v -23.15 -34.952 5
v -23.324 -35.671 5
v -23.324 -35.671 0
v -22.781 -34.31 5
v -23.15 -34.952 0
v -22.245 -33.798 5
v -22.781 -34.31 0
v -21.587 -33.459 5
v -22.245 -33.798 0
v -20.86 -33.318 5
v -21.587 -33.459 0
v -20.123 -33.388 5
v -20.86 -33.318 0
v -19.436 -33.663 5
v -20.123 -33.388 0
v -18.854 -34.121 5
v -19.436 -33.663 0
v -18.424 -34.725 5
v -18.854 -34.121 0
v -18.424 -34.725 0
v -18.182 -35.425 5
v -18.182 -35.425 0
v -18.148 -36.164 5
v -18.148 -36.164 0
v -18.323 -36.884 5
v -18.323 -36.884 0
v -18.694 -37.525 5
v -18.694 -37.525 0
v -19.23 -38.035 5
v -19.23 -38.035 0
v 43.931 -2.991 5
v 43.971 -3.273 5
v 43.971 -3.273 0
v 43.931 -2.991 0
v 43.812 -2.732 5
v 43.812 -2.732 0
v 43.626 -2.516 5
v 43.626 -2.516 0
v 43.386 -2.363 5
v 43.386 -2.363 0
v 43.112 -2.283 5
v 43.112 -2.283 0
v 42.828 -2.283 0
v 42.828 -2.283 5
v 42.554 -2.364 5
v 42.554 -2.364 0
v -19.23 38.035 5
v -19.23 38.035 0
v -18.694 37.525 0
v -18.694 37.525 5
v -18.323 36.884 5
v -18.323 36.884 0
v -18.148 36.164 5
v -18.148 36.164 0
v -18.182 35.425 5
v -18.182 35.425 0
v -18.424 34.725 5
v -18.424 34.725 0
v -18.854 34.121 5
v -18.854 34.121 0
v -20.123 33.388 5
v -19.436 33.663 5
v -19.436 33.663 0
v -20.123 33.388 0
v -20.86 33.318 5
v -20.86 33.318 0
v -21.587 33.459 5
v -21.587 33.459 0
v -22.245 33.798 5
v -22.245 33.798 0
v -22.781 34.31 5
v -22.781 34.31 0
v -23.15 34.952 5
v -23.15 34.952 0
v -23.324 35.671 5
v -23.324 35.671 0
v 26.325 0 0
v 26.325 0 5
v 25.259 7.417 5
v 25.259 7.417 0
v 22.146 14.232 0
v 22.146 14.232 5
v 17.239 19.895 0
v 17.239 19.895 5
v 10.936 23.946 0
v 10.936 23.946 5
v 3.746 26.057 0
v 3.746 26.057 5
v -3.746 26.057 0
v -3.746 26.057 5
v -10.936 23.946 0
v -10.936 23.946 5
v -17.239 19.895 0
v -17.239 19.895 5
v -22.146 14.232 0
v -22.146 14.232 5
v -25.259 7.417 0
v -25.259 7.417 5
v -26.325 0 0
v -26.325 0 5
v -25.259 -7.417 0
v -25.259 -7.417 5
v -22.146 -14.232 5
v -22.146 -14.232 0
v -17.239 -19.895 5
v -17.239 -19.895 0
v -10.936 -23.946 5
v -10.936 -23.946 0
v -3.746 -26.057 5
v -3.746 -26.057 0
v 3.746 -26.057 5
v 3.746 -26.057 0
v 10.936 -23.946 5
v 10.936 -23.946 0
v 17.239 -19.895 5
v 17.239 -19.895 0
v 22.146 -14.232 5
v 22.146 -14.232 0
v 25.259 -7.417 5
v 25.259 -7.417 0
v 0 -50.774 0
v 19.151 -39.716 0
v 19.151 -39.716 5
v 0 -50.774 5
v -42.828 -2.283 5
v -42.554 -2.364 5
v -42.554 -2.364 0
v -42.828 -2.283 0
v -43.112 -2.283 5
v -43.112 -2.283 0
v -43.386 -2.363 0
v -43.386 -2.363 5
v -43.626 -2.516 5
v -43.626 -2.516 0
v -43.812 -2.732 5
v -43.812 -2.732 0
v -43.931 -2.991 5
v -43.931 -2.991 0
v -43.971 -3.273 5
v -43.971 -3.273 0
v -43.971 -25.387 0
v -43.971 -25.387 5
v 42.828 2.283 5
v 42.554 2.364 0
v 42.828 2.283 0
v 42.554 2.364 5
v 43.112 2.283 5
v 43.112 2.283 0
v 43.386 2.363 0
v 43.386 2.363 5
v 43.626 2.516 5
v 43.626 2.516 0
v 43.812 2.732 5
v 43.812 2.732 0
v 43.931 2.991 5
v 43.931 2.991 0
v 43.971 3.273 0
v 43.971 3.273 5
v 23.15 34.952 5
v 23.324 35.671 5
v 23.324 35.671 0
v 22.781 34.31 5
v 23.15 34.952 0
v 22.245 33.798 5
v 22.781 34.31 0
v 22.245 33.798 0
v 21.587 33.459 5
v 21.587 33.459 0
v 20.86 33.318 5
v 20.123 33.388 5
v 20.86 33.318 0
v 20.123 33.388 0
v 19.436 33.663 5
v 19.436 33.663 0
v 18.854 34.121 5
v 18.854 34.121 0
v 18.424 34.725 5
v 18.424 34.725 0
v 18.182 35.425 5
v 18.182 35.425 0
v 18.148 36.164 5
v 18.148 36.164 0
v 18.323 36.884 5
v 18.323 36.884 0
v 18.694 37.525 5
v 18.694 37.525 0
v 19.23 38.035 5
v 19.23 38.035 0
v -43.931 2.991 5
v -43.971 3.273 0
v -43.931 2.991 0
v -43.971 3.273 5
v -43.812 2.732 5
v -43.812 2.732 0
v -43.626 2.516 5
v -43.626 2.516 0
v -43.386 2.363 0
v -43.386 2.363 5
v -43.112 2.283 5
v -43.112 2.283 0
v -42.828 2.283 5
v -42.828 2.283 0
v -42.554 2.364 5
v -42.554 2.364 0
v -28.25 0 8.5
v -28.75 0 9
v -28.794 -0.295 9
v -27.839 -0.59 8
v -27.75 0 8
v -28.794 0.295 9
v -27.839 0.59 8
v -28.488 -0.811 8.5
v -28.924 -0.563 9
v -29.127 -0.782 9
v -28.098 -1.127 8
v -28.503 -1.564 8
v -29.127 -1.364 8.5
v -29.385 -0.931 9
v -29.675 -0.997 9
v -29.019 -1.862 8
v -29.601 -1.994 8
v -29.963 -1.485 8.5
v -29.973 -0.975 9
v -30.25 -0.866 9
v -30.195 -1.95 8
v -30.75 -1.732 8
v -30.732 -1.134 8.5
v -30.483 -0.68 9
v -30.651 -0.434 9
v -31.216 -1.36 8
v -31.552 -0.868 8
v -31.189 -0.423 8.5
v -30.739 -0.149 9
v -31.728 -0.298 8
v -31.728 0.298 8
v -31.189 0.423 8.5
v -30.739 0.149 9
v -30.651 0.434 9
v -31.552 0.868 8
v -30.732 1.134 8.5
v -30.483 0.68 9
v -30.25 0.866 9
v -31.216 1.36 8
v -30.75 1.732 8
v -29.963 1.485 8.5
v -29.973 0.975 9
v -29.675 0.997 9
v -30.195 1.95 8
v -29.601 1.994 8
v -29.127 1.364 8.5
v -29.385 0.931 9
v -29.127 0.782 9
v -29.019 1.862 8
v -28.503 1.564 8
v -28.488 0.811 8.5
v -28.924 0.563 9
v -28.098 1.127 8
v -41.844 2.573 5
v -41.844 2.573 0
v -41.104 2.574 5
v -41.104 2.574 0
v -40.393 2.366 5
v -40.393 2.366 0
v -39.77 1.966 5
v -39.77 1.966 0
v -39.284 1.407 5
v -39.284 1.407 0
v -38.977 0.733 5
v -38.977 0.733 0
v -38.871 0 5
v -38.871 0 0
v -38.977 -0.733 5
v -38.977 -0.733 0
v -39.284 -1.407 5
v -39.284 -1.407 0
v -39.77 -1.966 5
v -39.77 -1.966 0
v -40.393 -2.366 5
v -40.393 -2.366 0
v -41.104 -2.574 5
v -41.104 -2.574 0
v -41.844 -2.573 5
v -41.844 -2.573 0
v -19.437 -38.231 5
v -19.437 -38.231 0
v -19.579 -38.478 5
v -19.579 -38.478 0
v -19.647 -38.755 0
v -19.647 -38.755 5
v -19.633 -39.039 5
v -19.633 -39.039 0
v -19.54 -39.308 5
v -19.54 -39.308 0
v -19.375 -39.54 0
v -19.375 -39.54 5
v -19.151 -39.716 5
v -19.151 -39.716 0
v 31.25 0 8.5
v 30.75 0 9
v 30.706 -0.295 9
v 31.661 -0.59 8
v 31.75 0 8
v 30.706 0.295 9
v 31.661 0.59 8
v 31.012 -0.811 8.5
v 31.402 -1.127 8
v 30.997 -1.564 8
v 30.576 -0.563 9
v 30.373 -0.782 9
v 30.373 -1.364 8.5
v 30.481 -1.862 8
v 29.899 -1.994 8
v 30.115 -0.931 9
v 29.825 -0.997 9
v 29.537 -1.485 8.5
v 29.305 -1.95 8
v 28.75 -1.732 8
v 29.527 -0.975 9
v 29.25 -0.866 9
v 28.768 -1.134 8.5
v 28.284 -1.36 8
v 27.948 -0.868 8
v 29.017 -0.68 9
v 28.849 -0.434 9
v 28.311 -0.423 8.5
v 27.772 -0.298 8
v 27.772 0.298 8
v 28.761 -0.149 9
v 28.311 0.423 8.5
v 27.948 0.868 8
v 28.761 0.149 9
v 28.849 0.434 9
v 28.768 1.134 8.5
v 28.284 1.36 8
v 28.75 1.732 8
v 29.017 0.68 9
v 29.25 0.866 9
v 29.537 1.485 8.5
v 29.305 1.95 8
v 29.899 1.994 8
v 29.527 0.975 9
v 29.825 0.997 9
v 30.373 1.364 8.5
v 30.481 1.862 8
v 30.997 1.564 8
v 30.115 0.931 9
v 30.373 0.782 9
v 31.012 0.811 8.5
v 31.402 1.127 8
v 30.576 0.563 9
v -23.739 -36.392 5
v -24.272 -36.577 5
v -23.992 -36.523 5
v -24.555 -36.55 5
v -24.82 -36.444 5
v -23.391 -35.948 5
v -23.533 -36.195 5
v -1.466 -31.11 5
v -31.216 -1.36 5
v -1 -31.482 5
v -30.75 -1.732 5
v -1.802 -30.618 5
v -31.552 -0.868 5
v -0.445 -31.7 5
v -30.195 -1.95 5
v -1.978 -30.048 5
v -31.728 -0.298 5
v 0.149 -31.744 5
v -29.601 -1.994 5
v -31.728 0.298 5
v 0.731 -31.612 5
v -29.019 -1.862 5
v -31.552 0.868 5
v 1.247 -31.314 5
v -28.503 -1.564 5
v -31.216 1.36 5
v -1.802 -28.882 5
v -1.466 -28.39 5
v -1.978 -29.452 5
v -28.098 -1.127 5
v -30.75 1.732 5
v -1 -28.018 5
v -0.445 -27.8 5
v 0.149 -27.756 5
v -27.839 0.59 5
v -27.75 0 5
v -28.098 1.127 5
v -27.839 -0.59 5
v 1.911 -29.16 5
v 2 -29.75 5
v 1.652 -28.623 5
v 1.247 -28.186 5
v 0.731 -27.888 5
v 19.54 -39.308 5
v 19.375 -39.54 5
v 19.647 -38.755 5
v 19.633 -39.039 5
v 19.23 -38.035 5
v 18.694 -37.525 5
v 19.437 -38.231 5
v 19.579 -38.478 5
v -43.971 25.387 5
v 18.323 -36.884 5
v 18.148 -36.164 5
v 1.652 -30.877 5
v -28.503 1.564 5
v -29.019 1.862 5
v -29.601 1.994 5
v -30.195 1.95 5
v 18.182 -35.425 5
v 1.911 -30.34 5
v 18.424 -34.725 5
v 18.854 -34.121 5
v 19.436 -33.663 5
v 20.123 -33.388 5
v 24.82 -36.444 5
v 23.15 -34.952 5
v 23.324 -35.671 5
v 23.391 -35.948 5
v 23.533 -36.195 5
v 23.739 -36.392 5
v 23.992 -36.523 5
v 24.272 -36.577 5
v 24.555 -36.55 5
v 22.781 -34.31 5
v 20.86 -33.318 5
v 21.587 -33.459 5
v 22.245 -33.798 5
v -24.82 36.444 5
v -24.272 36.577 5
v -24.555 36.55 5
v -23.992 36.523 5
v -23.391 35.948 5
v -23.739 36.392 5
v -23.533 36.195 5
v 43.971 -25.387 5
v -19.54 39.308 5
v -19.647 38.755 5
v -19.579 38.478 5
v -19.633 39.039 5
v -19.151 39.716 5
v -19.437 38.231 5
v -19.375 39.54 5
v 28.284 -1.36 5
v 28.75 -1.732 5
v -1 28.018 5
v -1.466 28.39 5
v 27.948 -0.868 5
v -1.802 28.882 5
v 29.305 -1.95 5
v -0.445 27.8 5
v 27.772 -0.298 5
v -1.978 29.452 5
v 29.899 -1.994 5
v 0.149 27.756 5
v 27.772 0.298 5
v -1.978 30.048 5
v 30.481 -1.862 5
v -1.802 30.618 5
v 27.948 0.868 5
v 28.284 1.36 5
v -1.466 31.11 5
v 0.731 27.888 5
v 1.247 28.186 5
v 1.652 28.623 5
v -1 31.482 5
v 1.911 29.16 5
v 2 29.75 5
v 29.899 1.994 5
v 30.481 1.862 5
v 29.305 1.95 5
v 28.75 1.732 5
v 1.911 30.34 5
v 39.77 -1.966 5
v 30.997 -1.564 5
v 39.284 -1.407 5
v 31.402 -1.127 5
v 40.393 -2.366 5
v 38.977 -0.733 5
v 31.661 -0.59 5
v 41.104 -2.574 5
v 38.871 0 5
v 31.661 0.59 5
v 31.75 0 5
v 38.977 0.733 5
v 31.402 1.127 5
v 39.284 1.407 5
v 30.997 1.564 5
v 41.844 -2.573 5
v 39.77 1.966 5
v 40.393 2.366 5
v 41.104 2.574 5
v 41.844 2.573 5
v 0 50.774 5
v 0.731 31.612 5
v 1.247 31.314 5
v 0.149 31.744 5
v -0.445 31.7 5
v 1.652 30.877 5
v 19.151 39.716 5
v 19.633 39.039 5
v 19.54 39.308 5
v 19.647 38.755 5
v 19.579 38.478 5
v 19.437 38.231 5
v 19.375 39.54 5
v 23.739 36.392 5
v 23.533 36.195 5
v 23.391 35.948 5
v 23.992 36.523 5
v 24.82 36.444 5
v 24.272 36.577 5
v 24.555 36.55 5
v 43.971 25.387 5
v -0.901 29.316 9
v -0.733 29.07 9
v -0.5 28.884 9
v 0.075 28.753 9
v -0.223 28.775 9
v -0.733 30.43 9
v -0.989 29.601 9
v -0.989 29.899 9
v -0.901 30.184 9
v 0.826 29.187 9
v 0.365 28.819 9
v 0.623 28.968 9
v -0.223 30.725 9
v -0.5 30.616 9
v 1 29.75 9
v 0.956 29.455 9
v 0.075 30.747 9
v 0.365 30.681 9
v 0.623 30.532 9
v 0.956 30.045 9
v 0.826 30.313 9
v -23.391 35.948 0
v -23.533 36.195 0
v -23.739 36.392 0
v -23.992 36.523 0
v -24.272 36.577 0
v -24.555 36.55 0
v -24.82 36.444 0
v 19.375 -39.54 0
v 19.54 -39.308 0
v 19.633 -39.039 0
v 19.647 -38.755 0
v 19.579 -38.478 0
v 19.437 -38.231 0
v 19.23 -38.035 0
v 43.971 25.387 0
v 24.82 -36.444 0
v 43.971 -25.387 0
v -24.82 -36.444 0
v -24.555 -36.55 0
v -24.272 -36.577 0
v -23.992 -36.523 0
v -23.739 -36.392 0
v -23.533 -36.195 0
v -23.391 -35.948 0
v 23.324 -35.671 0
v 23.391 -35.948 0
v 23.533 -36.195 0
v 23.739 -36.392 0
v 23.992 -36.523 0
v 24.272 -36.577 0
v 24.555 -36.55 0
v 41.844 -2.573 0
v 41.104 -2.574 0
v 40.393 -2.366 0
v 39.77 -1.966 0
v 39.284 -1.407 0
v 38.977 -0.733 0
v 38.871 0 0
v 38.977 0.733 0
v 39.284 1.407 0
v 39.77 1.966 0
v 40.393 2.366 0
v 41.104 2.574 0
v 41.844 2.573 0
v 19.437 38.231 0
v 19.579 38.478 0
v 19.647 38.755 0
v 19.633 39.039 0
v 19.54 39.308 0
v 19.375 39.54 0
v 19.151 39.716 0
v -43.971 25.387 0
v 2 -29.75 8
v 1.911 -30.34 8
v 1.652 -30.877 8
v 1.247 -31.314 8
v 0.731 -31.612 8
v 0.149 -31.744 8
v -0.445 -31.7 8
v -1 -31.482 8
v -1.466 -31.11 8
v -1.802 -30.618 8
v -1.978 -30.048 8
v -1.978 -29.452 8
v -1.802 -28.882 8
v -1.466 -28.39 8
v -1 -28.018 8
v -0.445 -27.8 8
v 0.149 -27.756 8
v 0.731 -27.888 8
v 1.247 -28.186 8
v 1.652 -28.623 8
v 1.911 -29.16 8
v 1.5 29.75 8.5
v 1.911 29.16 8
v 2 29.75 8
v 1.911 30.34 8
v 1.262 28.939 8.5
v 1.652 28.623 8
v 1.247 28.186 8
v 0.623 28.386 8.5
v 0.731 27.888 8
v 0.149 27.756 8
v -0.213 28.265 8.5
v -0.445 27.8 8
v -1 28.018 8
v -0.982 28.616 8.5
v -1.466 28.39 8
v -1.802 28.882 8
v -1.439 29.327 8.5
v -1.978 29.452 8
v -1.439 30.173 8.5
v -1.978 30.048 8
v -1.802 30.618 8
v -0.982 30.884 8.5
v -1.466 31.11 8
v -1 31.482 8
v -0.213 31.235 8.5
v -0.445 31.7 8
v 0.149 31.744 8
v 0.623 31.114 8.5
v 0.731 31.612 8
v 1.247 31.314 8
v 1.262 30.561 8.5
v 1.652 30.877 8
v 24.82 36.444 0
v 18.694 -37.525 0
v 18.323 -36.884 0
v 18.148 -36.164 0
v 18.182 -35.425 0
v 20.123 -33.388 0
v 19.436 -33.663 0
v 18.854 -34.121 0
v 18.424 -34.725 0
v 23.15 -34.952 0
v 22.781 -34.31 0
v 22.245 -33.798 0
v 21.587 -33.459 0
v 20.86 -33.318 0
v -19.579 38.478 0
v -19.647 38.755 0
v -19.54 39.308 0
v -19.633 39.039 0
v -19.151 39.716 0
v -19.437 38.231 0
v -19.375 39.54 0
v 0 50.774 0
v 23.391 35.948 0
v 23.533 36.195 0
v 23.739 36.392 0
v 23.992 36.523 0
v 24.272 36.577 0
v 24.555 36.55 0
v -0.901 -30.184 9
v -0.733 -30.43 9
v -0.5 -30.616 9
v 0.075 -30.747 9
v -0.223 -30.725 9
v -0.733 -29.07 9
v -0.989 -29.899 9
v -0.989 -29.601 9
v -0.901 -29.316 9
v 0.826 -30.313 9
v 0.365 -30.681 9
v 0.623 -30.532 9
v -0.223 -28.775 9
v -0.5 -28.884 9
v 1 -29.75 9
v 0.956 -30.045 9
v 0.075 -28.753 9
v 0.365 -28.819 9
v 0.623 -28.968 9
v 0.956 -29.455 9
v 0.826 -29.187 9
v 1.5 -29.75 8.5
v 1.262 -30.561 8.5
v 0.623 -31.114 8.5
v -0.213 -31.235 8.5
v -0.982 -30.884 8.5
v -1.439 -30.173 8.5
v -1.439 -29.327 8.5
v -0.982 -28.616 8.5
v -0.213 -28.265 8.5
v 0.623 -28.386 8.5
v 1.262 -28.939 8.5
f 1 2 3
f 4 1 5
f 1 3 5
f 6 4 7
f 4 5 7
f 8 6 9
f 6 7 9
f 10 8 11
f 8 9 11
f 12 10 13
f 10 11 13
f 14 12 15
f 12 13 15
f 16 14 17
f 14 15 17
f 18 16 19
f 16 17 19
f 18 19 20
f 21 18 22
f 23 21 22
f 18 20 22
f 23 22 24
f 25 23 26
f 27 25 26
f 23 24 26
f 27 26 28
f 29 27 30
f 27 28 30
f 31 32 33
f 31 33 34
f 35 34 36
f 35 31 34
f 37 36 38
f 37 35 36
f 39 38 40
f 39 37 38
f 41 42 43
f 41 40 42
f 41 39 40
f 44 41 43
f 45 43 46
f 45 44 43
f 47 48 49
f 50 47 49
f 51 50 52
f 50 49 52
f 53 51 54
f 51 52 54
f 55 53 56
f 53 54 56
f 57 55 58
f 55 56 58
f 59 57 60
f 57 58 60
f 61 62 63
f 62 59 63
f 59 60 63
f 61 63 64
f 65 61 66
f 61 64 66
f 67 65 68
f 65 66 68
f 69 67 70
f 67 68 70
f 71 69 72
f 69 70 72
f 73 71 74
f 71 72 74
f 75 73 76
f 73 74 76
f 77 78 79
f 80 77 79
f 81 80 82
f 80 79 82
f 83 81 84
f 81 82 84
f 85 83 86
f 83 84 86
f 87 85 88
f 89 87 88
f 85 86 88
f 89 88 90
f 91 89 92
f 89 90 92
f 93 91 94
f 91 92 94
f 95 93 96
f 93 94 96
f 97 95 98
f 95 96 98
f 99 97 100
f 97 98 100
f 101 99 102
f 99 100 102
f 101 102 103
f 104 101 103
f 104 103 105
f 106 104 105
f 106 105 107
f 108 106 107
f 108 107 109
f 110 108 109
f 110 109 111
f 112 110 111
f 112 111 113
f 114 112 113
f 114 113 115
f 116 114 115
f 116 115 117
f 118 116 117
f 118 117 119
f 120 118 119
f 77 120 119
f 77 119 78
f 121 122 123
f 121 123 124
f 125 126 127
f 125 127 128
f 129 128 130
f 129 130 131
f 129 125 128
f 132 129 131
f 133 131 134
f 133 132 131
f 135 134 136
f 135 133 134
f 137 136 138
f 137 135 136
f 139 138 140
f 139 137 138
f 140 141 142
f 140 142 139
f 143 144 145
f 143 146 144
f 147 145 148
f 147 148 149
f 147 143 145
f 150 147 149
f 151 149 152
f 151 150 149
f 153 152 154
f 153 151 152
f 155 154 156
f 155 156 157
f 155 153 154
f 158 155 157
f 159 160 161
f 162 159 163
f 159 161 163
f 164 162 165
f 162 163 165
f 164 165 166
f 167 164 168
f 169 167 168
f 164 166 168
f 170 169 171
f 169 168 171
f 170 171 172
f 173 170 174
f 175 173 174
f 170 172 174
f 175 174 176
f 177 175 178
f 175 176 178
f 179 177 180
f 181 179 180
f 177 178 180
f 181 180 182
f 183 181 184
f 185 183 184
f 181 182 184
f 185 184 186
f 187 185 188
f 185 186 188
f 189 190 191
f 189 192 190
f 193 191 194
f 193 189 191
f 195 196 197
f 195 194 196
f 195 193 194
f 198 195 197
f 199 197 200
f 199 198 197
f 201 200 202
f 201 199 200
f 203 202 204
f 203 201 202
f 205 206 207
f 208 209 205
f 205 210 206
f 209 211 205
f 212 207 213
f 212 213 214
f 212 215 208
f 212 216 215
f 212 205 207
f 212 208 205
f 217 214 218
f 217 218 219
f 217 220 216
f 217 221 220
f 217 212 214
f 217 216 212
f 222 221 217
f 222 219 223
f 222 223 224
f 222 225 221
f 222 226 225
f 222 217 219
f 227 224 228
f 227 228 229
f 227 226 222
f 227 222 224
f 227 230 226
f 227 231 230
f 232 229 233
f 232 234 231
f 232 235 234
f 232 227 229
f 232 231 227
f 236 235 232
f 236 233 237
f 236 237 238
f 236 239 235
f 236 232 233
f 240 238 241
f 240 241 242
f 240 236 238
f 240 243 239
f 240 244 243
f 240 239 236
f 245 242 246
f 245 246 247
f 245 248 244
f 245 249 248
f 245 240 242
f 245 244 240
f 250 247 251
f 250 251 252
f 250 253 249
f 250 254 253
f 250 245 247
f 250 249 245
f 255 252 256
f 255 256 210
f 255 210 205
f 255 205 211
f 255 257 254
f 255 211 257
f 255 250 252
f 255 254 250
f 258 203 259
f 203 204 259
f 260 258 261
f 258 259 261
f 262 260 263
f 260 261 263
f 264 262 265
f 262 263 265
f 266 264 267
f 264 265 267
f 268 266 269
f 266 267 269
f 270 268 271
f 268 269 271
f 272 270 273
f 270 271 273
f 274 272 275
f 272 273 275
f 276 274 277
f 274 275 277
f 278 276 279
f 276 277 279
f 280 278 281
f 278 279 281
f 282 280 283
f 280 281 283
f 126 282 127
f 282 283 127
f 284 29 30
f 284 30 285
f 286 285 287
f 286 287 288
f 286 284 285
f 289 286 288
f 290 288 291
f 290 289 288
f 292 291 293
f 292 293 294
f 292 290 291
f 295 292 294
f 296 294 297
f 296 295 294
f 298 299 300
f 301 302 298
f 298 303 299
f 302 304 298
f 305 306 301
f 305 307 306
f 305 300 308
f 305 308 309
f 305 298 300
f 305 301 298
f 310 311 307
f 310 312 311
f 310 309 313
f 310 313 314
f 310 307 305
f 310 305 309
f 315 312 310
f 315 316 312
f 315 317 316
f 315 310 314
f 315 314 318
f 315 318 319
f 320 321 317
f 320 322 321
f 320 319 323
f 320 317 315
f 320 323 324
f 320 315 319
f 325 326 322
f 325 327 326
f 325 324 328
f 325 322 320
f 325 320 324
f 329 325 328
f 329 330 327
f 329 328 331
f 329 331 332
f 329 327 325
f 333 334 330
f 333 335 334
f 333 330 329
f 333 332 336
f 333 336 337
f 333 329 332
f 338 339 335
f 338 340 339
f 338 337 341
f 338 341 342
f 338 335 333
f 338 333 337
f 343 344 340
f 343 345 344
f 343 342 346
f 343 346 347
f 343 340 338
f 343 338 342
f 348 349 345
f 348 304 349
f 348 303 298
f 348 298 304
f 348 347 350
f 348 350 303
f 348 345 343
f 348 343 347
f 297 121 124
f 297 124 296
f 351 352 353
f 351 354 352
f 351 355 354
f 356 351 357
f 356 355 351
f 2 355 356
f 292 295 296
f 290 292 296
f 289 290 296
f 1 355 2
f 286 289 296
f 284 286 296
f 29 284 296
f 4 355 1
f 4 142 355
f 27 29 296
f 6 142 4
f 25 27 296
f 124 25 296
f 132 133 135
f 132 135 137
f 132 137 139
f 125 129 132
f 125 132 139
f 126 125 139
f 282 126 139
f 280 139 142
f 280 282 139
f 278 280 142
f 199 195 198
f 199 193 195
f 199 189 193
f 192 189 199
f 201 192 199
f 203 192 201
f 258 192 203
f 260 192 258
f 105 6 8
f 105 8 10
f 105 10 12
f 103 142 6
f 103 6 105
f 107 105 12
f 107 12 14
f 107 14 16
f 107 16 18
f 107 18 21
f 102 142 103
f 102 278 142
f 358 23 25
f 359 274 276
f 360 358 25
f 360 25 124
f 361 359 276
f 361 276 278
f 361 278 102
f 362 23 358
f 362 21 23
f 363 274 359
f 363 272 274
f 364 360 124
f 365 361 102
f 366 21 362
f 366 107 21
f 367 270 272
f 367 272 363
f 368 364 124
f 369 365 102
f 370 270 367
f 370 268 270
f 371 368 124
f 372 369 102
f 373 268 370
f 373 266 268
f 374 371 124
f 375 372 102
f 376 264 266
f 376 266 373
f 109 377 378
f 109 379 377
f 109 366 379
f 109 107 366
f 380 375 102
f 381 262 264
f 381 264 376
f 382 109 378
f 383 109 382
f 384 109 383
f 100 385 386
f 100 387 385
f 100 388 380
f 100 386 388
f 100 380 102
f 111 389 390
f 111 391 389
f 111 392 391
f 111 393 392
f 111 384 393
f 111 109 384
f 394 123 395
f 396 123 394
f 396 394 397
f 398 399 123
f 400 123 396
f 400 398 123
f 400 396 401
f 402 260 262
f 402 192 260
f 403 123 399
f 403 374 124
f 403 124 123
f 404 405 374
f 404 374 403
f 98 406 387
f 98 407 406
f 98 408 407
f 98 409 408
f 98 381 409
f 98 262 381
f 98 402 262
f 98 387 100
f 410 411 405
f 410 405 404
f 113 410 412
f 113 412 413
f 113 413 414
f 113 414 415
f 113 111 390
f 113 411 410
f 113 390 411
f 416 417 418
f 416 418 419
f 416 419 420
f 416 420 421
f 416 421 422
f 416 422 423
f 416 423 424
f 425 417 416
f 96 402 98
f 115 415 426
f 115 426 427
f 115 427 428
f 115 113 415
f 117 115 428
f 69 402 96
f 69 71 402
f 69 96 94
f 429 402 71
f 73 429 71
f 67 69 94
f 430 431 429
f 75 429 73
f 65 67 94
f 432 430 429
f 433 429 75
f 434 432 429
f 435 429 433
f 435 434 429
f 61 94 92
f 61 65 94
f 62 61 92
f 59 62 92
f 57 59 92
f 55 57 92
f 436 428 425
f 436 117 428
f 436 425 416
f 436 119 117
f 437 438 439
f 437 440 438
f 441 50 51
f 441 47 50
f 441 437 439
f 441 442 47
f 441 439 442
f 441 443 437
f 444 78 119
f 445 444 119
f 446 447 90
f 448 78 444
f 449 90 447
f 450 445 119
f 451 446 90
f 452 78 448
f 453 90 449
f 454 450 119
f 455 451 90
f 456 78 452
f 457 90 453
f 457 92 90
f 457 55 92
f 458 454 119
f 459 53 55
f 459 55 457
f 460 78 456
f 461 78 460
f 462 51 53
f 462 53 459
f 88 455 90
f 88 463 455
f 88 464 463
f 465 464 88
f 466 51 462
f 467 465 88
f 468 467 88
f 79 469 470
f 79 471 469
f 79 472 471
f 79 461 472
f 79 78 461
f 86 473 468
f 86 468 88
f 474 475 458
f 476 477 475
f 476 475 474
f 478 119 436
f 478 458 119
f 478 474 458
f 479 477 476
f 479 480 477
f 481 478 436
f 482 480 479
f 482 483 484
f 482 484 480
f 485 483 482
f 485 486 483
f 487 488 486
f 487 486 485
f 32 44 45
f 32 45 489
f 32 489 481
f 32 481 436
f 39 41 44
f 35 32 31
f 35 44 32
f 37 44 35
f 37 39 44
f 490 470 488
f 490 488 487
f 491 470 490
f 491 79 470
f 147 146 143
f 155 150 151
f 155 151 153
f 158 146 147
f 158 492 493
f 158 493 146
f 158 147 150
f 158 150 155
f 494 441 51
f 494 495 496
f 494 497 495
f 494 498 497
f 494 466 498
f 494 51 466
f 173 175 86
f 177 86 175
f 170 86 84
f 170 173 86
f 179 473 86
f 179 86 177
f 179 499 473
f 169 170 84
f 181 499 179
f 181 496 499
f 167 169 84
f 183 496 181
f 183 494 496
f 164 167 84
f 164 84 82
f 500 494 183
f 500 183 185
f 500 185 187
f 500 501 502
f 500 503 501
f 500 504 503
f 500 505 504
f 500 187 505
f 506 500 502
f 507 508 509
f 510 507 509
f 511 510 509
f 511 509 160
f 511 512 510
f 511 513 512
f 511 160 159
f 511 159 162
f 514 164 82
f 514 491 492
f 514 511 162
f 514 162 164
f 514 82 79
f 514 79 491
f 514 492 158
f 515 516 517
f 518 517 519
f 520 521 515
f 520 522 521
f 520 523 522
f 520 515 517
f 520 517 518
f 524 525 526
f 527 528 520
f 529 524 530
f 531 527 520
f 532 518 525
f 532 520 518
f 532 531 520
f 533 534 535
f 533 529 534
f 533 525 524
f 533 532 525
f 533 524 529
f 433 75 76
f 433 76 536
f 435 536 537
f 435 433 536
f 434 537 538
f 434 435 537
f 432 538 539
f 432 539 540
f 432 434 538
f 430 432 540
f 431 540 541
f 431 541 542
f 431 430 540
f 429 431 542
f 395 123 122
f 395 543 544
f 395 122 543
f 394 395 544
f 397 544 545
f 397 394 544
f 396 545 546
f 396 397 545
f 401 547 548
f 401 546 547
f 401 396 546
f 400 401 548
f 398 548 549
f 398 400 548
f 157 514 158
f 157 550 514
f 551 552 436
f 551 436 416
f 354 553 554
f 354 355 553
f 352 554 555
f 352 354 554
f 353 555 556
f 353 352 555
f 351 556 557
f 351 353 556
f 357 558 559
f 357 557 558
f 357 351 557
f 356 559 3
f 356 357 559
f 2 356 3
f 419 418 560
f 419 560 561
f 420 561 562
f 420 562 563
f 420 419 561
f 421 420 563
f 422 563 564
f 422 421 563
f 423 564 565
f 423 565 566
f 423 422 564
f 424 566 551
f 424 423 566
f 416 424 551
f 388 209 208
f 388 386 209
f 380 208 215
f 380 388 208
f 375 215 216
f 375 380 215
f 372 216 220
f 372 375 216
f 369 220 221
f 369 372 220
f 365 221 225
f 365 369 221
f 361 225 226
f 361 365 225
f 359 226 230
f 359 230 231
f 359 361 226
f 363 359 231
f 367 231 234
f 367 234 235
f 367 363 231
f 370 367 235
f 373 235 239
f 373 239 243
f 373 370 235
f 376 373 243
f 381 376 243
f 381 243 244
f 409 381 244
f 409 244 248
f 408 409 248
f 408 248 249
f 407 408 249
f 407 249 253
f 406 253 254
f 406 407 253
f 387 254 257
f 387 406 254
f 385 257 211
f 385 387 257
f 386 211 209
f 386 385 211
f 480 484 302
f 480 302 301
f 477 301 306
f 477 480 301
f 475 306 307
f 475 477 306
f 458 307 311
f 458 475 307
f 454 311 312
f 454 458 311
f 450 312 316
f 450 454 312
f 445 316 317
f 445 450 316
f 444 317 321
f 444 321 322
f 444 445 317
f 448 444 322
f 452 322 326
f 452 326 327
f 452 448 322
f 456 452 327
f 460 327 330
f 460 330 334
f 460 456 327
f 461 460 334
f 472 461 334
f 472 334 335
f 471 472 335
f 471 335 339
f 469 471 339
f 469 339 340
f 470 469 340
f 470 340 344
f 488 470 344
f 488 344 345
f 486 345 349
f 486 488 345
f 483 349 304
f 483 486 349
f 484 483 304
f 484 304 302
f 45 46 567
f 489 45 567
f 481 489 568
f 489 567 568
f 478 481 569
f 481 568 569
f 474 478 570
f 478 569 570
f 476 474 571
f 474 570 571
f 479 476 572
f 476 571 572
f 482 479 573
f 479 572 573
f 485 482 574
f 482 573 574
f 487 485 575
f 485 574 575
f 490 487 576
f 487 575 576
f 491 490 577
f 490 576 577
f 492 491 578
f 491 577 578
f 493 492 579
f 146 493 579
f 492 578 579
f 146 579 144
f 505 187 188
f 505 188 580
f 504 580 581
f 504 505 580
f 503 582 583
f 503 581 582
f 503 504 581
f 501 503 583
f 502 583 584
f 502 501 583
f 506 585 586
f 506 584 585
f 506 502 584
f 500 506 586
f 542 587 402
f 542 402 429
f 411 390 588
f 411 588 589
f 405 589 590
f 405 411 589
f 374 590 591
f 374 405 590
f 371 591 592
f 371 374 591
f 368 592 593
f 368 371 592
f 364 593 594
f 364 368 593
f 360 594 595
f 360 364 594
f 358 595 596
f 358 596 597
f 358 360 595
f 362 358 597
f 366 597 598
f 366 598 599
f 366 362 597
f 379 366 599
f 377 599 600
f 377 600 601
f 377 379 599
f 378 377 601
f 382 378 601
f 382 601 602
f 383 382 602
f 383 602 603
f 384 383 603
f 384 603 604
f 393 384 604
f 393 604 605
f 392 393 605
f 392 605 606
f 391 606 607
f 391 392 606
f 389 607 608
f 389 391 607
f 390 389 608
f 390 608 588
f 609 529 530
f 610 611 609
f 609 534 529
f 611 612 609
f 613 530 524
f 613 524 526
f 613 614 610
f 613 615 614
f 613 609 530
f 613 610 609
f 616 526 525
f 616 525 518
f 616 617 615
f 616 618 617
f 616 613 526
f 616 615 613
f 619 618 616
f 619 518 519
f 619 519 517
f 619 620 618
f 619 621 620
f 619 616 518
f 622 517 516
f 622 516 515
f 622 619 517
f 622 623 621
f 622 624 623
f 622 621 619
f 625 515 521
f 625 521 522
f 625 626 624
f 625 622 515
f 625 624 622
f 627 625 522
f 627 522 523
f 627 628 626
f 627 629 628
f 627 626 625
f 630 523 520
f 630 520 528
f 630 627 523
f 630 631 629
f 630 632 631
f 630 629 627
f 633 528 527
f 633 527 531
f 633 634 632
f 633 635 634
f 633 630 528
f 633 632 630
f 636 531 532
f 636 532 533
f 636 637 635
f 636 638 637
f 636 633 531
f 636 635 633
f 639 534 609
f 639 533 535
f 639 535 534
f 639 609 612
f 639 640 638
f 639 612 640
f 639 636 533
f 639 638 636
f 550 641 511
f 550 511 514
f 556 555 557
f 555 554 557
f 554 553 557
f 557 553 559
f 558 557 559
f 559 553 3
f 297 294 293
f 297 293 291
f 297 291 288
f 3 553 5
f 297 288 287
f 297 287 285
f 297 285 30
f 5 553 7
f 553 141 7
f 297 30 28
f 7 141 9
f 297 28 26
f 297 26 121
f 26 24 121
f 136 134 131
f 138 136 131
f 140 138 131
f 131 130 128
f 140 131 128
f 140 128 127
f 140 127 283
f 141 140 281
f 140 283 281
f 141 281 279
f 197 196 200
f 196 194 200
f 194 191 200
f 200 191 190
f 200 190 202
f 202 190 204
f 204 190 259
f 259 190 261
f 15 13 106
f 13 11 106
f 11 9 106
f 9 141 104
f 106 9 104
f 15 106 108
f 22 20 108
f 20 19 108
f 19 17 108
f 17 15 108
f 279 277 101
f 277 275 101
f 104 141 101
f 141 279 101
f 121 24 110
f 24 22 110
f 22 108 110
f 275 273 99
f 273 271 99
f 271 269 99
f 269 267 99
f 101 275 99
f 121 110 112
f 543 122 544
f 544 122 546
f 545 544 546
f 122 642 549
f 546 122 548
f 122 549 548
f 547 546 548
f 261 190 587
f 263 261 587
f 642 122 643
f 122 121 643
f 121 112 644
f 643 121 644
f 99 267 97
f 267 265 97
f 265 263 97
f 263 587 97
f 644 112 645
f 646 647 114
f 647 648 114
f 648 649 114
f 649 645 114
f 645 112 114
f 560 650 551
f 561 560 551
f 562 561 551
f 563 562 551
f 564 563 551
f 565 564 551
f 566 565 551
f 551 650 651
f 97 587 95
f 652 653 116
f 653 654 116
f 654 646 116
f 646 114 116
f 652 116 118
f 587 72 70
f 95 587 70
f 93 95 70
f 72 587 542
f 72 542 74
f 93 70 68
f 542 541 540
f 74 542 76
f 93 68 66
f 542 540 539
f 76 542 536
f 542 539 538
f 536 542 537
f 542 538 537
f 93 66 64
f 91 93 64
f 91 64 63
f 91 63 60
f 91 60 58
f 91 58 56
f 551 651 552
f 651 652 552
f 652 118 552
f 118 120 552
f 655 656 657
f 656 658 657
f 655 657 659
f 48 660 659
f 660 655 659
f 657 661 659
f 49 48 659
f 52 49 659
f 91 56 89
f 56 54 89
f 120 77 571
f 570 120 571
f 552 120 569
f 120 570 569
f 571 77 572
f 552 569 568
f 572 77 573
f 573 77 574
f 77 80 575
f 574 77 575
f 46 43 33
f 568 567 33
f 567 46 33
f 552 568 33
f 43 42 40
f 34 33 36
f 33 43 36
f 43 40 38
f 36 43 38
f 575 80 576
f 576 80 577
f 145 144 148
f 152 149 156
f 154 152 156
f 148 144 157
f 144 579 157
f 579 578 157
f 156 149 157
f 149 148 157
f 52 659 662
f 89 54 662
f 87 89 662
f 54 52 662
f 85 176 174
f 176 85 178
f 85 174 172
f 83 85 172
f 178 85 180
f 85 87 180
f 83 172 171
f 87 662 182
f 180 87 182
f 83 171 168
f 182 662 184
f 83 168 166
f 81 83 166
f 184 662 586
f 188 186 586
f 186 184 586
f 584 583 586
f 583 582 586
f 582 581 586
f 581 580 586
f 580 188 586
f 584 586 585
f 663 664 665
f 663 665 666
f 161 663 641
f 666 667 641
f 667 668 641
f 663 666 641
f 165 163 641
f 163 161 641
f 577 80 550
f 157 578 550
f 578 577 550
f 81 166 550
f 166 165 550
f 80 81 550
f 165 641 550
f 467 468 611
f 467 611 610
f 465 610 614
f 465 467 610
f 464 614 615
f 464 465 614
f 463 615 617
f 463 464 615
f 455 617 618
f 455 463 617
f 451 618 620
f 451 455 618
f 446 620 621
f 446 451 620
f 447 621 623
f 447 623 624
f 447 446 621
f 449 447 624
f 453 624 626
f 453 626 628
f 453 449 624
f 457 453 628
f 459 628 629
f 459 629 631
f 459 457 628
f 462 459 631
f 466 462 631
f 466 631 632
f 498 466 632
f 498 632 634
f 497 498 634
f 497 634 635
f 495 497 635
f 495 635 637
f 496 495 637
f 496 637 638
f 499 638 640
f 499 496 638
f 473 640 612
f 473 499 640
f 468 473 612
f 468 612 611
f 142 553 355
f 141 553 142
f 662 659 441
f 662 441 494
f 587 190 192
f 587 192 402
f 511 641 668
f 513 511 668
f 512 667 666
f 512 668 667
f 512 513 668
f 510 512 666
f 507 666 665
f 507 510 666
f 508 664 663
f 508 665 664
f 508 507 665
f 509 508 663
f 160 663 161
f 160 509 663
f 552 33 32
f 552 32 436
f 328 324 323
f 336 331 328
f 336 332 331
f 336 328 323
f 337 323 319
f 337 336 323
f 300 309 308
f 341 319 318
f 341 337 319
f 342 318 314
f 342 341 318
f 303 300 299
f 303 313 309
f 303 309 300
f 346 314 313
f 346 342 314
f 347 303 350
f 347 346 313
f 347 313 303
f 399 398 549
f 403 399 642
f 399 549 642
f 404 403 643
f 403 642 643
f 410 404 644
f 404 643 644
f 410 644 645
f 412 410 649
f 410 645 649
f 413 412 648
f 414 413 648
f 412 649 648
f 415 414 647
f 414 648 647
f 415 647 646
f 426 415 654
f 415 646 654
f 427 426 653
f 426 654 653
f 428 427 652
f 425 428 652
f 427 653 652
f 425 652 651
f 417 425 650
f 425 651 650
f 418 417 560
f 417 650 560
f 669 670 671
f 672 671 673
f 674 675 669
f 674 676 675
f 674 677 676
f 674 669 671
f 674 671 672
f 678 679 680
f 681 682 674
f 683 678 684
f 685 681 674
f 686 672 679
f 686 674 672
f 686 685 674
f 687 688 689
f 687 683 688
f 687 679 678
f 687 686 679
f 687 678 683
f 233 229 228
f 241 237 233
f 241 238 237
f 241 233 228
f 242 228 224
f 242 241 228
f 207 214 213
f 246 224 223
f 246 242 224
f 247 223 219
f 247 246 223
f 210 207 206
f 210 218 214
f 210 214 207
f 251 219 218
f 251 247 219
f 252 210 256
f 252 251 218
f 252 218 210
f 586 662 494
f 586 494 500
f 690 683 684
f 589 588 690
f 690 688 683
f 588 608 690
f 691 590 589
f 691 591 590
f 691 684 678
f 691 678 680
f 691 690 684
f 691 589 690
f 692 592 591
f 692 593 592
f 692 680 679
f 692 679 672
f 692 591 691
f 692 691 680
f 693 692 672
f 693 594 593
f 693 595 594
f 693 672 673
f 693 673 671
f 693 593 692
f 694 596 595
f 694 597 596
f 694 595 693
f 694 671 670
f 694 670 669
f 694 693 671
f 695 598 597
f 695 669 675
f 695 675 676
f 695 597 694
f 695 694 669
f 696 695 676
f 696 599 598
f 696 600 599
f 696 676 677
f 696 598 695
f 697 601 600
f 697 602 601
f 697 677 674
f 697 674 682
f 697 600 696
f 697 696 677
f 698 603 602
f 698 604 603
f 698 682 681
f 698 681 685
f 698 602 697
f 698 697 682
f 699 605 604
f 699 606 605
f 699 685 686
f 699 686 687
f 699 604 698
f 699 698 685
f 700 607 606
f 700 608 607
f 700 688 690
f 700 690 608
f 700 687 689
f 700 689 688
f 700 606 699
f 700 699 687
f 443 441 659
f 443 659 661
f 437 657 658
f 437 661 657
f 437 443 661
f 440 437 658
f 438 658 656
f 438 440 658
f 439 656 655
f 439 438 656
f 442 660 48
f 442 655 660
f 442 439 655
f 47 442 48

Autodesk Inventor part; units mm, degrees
ref_plane "YZ Plane" through (0, 0, 0) normal (1, 0, 0) x (0, 1, 0)
ref_plane "XZ Plane" through (0, 0, 0) normal (0, 1, 0) x (-1, 0, 0)
ref_plane "XY Plane" through (0, 0, 0) normal (0, 0, 1) x (1, 0, 0)
sketch "스케치1" plane through (0, 0, 0) normal (0, 0, 1) x (1, 0, 0)
  line L0 (0, 45) -> (38.9711, 22.5)
  line L1 (38.9711, 22.5) -> (38.9711, -22.5)
  line L2 (38.9711, -22.5) -> (0, -45)
  line L3 (0, -45) -> (-38.9711, -22.5)
  line L4 (-38.9711, -22.5) -> (-38.9711, 22.5)
  line L5 (-38.9711, 22.5) -> (0, 45)
  line L6 (0, 50.7735) -> (43.9711, 25.3868)
  line L7 (43.9711, 25.3868) -> (43.9711, -25.3868)
  line L8 (43.9711, -25.3868) -> (0, -50.7735)
  line L9 (0, -50.7735) -> (-43.9711, -25.3868)
  line L10 (-43.9711, -25.3868) -> (-43.9711, 25.3868)
  line L11 (-43.9711, 25.3868) -> (0, 50.7735)
  circle A0 centre (-41.4711, 0) radius 2.5 construction
  circle A1 centre (-41.4711, 0) radius 2.6
  circle A2 centre (-20.7356, -35.9151) radius 2.6
  circle A3 centre (20.7356, -35.9151) radius 2.6
  circle A4 centre (41.4711, 0) radius 2.6
  circle A5 centre (20.7356, 35.9151) radius 2.6
  circle A6 centre (-20.7356, 35.9151) radius 2.6
  point P0 (0, 0)
  point P1 (0, 0)
  point P2 (-22.604, 37.7231)
  point P3 (-43.9711, 0.7141)
  point P4 (-43.9711, -0.7141)
  point P5 (-22.604, -37.7231)
  point P6 (-21.3671, -38.4372)
  point P7 (21.3671, -38.4372)
  point P8 (22.604, -37.7231)
  point P9 (43.9711, -0.7141)
  point P10 (43.9711, 0.7141)
  point P11 (22.604, 37.7231)
  point P12 (21.3671, 38.4372)
  point P13 (-21.3671, 38.4372)
  dimension "d0" = 45
  dimension "d1" = 5
  dimension "d2" = 5
  dimension "d3" = 5.2
  dimension "d6" = 360
extrude "돌출1" add sketch "스케치1" along normal blind 5 contours L5 A6 L11 L6 A5 L0 | L0 A5 L1 A4 L2 A3 L3 A2 L4 A1 L5 A6 | A5 L6 L7 A4 L1 L0 | L5 L4 A1 L10 L11 A6 | A4 L7 L8 A3 L2 L1 | L4 L3 A2 L9 L10 A1 | A3 L8 L9 A2 L3 L2
fillet "모깎기1" radius 1 12 edges at (-22.604, 37.7231, 2.5) (-21.3671, 38.4372, 2.5) (-43.9711, 0.7141, 2.5) (-43.9711, -0.7141, 2.5) (-22.604, -37.7231, 2.5) (-21.3671, -38.4372, 2.5) (21.3671, -38.4372, 2.5) (22.604, -37.7231, 2.5) (43.9711, -0.7141, 2.5) (43.9711, 0.7141, 2.5) (21.3671, 38.4372, 2.5) (22.604, 37.7231, 2.5)
sketch "스케치2" plane through (0, 0, 5) normal (0, 0, 1) x (1, 0, 0)
  circle A0 centre (0, 0) radius 26.325
  dimension "d11" = 52.65
extrude "돌출2" cut sketch "스케치2" against normal through all
sketch "스케치3" plane through (0, 0, 5) normal (0, 0, 1) x (1, 0, 0)
  circle A0 centre (0, 0) radius 26.325 construction
  circle A1 centre (0, 0) radius 29.75
  circle A2 centre (0, 29.75) radius 2
  circle A3 centre (-29.75, 0) radius 2
  circle A4 centre (0, -29.75) radius 2
  circle A5 centre (29.75, 0) radius 2
  dimension "d14" = 59.5
  dimension "d15" = 4
  dimension "d18" = 360
extrude "돌출3" add sketch "스케치3" along normal blind 4 contours A1 A5 | A1 A5 | A2 A1 | A1 A2 | A4 A1 | A1 A4 | A3 A1 | A1 A3
chamfer "모따기1" distance 1 angle 45 4 edges at (-31.75, 0, 9) (-2, 29.75, 9) (27.75, 0, 9) (-2, -29.75, 9)
properties part number "inner_top"
